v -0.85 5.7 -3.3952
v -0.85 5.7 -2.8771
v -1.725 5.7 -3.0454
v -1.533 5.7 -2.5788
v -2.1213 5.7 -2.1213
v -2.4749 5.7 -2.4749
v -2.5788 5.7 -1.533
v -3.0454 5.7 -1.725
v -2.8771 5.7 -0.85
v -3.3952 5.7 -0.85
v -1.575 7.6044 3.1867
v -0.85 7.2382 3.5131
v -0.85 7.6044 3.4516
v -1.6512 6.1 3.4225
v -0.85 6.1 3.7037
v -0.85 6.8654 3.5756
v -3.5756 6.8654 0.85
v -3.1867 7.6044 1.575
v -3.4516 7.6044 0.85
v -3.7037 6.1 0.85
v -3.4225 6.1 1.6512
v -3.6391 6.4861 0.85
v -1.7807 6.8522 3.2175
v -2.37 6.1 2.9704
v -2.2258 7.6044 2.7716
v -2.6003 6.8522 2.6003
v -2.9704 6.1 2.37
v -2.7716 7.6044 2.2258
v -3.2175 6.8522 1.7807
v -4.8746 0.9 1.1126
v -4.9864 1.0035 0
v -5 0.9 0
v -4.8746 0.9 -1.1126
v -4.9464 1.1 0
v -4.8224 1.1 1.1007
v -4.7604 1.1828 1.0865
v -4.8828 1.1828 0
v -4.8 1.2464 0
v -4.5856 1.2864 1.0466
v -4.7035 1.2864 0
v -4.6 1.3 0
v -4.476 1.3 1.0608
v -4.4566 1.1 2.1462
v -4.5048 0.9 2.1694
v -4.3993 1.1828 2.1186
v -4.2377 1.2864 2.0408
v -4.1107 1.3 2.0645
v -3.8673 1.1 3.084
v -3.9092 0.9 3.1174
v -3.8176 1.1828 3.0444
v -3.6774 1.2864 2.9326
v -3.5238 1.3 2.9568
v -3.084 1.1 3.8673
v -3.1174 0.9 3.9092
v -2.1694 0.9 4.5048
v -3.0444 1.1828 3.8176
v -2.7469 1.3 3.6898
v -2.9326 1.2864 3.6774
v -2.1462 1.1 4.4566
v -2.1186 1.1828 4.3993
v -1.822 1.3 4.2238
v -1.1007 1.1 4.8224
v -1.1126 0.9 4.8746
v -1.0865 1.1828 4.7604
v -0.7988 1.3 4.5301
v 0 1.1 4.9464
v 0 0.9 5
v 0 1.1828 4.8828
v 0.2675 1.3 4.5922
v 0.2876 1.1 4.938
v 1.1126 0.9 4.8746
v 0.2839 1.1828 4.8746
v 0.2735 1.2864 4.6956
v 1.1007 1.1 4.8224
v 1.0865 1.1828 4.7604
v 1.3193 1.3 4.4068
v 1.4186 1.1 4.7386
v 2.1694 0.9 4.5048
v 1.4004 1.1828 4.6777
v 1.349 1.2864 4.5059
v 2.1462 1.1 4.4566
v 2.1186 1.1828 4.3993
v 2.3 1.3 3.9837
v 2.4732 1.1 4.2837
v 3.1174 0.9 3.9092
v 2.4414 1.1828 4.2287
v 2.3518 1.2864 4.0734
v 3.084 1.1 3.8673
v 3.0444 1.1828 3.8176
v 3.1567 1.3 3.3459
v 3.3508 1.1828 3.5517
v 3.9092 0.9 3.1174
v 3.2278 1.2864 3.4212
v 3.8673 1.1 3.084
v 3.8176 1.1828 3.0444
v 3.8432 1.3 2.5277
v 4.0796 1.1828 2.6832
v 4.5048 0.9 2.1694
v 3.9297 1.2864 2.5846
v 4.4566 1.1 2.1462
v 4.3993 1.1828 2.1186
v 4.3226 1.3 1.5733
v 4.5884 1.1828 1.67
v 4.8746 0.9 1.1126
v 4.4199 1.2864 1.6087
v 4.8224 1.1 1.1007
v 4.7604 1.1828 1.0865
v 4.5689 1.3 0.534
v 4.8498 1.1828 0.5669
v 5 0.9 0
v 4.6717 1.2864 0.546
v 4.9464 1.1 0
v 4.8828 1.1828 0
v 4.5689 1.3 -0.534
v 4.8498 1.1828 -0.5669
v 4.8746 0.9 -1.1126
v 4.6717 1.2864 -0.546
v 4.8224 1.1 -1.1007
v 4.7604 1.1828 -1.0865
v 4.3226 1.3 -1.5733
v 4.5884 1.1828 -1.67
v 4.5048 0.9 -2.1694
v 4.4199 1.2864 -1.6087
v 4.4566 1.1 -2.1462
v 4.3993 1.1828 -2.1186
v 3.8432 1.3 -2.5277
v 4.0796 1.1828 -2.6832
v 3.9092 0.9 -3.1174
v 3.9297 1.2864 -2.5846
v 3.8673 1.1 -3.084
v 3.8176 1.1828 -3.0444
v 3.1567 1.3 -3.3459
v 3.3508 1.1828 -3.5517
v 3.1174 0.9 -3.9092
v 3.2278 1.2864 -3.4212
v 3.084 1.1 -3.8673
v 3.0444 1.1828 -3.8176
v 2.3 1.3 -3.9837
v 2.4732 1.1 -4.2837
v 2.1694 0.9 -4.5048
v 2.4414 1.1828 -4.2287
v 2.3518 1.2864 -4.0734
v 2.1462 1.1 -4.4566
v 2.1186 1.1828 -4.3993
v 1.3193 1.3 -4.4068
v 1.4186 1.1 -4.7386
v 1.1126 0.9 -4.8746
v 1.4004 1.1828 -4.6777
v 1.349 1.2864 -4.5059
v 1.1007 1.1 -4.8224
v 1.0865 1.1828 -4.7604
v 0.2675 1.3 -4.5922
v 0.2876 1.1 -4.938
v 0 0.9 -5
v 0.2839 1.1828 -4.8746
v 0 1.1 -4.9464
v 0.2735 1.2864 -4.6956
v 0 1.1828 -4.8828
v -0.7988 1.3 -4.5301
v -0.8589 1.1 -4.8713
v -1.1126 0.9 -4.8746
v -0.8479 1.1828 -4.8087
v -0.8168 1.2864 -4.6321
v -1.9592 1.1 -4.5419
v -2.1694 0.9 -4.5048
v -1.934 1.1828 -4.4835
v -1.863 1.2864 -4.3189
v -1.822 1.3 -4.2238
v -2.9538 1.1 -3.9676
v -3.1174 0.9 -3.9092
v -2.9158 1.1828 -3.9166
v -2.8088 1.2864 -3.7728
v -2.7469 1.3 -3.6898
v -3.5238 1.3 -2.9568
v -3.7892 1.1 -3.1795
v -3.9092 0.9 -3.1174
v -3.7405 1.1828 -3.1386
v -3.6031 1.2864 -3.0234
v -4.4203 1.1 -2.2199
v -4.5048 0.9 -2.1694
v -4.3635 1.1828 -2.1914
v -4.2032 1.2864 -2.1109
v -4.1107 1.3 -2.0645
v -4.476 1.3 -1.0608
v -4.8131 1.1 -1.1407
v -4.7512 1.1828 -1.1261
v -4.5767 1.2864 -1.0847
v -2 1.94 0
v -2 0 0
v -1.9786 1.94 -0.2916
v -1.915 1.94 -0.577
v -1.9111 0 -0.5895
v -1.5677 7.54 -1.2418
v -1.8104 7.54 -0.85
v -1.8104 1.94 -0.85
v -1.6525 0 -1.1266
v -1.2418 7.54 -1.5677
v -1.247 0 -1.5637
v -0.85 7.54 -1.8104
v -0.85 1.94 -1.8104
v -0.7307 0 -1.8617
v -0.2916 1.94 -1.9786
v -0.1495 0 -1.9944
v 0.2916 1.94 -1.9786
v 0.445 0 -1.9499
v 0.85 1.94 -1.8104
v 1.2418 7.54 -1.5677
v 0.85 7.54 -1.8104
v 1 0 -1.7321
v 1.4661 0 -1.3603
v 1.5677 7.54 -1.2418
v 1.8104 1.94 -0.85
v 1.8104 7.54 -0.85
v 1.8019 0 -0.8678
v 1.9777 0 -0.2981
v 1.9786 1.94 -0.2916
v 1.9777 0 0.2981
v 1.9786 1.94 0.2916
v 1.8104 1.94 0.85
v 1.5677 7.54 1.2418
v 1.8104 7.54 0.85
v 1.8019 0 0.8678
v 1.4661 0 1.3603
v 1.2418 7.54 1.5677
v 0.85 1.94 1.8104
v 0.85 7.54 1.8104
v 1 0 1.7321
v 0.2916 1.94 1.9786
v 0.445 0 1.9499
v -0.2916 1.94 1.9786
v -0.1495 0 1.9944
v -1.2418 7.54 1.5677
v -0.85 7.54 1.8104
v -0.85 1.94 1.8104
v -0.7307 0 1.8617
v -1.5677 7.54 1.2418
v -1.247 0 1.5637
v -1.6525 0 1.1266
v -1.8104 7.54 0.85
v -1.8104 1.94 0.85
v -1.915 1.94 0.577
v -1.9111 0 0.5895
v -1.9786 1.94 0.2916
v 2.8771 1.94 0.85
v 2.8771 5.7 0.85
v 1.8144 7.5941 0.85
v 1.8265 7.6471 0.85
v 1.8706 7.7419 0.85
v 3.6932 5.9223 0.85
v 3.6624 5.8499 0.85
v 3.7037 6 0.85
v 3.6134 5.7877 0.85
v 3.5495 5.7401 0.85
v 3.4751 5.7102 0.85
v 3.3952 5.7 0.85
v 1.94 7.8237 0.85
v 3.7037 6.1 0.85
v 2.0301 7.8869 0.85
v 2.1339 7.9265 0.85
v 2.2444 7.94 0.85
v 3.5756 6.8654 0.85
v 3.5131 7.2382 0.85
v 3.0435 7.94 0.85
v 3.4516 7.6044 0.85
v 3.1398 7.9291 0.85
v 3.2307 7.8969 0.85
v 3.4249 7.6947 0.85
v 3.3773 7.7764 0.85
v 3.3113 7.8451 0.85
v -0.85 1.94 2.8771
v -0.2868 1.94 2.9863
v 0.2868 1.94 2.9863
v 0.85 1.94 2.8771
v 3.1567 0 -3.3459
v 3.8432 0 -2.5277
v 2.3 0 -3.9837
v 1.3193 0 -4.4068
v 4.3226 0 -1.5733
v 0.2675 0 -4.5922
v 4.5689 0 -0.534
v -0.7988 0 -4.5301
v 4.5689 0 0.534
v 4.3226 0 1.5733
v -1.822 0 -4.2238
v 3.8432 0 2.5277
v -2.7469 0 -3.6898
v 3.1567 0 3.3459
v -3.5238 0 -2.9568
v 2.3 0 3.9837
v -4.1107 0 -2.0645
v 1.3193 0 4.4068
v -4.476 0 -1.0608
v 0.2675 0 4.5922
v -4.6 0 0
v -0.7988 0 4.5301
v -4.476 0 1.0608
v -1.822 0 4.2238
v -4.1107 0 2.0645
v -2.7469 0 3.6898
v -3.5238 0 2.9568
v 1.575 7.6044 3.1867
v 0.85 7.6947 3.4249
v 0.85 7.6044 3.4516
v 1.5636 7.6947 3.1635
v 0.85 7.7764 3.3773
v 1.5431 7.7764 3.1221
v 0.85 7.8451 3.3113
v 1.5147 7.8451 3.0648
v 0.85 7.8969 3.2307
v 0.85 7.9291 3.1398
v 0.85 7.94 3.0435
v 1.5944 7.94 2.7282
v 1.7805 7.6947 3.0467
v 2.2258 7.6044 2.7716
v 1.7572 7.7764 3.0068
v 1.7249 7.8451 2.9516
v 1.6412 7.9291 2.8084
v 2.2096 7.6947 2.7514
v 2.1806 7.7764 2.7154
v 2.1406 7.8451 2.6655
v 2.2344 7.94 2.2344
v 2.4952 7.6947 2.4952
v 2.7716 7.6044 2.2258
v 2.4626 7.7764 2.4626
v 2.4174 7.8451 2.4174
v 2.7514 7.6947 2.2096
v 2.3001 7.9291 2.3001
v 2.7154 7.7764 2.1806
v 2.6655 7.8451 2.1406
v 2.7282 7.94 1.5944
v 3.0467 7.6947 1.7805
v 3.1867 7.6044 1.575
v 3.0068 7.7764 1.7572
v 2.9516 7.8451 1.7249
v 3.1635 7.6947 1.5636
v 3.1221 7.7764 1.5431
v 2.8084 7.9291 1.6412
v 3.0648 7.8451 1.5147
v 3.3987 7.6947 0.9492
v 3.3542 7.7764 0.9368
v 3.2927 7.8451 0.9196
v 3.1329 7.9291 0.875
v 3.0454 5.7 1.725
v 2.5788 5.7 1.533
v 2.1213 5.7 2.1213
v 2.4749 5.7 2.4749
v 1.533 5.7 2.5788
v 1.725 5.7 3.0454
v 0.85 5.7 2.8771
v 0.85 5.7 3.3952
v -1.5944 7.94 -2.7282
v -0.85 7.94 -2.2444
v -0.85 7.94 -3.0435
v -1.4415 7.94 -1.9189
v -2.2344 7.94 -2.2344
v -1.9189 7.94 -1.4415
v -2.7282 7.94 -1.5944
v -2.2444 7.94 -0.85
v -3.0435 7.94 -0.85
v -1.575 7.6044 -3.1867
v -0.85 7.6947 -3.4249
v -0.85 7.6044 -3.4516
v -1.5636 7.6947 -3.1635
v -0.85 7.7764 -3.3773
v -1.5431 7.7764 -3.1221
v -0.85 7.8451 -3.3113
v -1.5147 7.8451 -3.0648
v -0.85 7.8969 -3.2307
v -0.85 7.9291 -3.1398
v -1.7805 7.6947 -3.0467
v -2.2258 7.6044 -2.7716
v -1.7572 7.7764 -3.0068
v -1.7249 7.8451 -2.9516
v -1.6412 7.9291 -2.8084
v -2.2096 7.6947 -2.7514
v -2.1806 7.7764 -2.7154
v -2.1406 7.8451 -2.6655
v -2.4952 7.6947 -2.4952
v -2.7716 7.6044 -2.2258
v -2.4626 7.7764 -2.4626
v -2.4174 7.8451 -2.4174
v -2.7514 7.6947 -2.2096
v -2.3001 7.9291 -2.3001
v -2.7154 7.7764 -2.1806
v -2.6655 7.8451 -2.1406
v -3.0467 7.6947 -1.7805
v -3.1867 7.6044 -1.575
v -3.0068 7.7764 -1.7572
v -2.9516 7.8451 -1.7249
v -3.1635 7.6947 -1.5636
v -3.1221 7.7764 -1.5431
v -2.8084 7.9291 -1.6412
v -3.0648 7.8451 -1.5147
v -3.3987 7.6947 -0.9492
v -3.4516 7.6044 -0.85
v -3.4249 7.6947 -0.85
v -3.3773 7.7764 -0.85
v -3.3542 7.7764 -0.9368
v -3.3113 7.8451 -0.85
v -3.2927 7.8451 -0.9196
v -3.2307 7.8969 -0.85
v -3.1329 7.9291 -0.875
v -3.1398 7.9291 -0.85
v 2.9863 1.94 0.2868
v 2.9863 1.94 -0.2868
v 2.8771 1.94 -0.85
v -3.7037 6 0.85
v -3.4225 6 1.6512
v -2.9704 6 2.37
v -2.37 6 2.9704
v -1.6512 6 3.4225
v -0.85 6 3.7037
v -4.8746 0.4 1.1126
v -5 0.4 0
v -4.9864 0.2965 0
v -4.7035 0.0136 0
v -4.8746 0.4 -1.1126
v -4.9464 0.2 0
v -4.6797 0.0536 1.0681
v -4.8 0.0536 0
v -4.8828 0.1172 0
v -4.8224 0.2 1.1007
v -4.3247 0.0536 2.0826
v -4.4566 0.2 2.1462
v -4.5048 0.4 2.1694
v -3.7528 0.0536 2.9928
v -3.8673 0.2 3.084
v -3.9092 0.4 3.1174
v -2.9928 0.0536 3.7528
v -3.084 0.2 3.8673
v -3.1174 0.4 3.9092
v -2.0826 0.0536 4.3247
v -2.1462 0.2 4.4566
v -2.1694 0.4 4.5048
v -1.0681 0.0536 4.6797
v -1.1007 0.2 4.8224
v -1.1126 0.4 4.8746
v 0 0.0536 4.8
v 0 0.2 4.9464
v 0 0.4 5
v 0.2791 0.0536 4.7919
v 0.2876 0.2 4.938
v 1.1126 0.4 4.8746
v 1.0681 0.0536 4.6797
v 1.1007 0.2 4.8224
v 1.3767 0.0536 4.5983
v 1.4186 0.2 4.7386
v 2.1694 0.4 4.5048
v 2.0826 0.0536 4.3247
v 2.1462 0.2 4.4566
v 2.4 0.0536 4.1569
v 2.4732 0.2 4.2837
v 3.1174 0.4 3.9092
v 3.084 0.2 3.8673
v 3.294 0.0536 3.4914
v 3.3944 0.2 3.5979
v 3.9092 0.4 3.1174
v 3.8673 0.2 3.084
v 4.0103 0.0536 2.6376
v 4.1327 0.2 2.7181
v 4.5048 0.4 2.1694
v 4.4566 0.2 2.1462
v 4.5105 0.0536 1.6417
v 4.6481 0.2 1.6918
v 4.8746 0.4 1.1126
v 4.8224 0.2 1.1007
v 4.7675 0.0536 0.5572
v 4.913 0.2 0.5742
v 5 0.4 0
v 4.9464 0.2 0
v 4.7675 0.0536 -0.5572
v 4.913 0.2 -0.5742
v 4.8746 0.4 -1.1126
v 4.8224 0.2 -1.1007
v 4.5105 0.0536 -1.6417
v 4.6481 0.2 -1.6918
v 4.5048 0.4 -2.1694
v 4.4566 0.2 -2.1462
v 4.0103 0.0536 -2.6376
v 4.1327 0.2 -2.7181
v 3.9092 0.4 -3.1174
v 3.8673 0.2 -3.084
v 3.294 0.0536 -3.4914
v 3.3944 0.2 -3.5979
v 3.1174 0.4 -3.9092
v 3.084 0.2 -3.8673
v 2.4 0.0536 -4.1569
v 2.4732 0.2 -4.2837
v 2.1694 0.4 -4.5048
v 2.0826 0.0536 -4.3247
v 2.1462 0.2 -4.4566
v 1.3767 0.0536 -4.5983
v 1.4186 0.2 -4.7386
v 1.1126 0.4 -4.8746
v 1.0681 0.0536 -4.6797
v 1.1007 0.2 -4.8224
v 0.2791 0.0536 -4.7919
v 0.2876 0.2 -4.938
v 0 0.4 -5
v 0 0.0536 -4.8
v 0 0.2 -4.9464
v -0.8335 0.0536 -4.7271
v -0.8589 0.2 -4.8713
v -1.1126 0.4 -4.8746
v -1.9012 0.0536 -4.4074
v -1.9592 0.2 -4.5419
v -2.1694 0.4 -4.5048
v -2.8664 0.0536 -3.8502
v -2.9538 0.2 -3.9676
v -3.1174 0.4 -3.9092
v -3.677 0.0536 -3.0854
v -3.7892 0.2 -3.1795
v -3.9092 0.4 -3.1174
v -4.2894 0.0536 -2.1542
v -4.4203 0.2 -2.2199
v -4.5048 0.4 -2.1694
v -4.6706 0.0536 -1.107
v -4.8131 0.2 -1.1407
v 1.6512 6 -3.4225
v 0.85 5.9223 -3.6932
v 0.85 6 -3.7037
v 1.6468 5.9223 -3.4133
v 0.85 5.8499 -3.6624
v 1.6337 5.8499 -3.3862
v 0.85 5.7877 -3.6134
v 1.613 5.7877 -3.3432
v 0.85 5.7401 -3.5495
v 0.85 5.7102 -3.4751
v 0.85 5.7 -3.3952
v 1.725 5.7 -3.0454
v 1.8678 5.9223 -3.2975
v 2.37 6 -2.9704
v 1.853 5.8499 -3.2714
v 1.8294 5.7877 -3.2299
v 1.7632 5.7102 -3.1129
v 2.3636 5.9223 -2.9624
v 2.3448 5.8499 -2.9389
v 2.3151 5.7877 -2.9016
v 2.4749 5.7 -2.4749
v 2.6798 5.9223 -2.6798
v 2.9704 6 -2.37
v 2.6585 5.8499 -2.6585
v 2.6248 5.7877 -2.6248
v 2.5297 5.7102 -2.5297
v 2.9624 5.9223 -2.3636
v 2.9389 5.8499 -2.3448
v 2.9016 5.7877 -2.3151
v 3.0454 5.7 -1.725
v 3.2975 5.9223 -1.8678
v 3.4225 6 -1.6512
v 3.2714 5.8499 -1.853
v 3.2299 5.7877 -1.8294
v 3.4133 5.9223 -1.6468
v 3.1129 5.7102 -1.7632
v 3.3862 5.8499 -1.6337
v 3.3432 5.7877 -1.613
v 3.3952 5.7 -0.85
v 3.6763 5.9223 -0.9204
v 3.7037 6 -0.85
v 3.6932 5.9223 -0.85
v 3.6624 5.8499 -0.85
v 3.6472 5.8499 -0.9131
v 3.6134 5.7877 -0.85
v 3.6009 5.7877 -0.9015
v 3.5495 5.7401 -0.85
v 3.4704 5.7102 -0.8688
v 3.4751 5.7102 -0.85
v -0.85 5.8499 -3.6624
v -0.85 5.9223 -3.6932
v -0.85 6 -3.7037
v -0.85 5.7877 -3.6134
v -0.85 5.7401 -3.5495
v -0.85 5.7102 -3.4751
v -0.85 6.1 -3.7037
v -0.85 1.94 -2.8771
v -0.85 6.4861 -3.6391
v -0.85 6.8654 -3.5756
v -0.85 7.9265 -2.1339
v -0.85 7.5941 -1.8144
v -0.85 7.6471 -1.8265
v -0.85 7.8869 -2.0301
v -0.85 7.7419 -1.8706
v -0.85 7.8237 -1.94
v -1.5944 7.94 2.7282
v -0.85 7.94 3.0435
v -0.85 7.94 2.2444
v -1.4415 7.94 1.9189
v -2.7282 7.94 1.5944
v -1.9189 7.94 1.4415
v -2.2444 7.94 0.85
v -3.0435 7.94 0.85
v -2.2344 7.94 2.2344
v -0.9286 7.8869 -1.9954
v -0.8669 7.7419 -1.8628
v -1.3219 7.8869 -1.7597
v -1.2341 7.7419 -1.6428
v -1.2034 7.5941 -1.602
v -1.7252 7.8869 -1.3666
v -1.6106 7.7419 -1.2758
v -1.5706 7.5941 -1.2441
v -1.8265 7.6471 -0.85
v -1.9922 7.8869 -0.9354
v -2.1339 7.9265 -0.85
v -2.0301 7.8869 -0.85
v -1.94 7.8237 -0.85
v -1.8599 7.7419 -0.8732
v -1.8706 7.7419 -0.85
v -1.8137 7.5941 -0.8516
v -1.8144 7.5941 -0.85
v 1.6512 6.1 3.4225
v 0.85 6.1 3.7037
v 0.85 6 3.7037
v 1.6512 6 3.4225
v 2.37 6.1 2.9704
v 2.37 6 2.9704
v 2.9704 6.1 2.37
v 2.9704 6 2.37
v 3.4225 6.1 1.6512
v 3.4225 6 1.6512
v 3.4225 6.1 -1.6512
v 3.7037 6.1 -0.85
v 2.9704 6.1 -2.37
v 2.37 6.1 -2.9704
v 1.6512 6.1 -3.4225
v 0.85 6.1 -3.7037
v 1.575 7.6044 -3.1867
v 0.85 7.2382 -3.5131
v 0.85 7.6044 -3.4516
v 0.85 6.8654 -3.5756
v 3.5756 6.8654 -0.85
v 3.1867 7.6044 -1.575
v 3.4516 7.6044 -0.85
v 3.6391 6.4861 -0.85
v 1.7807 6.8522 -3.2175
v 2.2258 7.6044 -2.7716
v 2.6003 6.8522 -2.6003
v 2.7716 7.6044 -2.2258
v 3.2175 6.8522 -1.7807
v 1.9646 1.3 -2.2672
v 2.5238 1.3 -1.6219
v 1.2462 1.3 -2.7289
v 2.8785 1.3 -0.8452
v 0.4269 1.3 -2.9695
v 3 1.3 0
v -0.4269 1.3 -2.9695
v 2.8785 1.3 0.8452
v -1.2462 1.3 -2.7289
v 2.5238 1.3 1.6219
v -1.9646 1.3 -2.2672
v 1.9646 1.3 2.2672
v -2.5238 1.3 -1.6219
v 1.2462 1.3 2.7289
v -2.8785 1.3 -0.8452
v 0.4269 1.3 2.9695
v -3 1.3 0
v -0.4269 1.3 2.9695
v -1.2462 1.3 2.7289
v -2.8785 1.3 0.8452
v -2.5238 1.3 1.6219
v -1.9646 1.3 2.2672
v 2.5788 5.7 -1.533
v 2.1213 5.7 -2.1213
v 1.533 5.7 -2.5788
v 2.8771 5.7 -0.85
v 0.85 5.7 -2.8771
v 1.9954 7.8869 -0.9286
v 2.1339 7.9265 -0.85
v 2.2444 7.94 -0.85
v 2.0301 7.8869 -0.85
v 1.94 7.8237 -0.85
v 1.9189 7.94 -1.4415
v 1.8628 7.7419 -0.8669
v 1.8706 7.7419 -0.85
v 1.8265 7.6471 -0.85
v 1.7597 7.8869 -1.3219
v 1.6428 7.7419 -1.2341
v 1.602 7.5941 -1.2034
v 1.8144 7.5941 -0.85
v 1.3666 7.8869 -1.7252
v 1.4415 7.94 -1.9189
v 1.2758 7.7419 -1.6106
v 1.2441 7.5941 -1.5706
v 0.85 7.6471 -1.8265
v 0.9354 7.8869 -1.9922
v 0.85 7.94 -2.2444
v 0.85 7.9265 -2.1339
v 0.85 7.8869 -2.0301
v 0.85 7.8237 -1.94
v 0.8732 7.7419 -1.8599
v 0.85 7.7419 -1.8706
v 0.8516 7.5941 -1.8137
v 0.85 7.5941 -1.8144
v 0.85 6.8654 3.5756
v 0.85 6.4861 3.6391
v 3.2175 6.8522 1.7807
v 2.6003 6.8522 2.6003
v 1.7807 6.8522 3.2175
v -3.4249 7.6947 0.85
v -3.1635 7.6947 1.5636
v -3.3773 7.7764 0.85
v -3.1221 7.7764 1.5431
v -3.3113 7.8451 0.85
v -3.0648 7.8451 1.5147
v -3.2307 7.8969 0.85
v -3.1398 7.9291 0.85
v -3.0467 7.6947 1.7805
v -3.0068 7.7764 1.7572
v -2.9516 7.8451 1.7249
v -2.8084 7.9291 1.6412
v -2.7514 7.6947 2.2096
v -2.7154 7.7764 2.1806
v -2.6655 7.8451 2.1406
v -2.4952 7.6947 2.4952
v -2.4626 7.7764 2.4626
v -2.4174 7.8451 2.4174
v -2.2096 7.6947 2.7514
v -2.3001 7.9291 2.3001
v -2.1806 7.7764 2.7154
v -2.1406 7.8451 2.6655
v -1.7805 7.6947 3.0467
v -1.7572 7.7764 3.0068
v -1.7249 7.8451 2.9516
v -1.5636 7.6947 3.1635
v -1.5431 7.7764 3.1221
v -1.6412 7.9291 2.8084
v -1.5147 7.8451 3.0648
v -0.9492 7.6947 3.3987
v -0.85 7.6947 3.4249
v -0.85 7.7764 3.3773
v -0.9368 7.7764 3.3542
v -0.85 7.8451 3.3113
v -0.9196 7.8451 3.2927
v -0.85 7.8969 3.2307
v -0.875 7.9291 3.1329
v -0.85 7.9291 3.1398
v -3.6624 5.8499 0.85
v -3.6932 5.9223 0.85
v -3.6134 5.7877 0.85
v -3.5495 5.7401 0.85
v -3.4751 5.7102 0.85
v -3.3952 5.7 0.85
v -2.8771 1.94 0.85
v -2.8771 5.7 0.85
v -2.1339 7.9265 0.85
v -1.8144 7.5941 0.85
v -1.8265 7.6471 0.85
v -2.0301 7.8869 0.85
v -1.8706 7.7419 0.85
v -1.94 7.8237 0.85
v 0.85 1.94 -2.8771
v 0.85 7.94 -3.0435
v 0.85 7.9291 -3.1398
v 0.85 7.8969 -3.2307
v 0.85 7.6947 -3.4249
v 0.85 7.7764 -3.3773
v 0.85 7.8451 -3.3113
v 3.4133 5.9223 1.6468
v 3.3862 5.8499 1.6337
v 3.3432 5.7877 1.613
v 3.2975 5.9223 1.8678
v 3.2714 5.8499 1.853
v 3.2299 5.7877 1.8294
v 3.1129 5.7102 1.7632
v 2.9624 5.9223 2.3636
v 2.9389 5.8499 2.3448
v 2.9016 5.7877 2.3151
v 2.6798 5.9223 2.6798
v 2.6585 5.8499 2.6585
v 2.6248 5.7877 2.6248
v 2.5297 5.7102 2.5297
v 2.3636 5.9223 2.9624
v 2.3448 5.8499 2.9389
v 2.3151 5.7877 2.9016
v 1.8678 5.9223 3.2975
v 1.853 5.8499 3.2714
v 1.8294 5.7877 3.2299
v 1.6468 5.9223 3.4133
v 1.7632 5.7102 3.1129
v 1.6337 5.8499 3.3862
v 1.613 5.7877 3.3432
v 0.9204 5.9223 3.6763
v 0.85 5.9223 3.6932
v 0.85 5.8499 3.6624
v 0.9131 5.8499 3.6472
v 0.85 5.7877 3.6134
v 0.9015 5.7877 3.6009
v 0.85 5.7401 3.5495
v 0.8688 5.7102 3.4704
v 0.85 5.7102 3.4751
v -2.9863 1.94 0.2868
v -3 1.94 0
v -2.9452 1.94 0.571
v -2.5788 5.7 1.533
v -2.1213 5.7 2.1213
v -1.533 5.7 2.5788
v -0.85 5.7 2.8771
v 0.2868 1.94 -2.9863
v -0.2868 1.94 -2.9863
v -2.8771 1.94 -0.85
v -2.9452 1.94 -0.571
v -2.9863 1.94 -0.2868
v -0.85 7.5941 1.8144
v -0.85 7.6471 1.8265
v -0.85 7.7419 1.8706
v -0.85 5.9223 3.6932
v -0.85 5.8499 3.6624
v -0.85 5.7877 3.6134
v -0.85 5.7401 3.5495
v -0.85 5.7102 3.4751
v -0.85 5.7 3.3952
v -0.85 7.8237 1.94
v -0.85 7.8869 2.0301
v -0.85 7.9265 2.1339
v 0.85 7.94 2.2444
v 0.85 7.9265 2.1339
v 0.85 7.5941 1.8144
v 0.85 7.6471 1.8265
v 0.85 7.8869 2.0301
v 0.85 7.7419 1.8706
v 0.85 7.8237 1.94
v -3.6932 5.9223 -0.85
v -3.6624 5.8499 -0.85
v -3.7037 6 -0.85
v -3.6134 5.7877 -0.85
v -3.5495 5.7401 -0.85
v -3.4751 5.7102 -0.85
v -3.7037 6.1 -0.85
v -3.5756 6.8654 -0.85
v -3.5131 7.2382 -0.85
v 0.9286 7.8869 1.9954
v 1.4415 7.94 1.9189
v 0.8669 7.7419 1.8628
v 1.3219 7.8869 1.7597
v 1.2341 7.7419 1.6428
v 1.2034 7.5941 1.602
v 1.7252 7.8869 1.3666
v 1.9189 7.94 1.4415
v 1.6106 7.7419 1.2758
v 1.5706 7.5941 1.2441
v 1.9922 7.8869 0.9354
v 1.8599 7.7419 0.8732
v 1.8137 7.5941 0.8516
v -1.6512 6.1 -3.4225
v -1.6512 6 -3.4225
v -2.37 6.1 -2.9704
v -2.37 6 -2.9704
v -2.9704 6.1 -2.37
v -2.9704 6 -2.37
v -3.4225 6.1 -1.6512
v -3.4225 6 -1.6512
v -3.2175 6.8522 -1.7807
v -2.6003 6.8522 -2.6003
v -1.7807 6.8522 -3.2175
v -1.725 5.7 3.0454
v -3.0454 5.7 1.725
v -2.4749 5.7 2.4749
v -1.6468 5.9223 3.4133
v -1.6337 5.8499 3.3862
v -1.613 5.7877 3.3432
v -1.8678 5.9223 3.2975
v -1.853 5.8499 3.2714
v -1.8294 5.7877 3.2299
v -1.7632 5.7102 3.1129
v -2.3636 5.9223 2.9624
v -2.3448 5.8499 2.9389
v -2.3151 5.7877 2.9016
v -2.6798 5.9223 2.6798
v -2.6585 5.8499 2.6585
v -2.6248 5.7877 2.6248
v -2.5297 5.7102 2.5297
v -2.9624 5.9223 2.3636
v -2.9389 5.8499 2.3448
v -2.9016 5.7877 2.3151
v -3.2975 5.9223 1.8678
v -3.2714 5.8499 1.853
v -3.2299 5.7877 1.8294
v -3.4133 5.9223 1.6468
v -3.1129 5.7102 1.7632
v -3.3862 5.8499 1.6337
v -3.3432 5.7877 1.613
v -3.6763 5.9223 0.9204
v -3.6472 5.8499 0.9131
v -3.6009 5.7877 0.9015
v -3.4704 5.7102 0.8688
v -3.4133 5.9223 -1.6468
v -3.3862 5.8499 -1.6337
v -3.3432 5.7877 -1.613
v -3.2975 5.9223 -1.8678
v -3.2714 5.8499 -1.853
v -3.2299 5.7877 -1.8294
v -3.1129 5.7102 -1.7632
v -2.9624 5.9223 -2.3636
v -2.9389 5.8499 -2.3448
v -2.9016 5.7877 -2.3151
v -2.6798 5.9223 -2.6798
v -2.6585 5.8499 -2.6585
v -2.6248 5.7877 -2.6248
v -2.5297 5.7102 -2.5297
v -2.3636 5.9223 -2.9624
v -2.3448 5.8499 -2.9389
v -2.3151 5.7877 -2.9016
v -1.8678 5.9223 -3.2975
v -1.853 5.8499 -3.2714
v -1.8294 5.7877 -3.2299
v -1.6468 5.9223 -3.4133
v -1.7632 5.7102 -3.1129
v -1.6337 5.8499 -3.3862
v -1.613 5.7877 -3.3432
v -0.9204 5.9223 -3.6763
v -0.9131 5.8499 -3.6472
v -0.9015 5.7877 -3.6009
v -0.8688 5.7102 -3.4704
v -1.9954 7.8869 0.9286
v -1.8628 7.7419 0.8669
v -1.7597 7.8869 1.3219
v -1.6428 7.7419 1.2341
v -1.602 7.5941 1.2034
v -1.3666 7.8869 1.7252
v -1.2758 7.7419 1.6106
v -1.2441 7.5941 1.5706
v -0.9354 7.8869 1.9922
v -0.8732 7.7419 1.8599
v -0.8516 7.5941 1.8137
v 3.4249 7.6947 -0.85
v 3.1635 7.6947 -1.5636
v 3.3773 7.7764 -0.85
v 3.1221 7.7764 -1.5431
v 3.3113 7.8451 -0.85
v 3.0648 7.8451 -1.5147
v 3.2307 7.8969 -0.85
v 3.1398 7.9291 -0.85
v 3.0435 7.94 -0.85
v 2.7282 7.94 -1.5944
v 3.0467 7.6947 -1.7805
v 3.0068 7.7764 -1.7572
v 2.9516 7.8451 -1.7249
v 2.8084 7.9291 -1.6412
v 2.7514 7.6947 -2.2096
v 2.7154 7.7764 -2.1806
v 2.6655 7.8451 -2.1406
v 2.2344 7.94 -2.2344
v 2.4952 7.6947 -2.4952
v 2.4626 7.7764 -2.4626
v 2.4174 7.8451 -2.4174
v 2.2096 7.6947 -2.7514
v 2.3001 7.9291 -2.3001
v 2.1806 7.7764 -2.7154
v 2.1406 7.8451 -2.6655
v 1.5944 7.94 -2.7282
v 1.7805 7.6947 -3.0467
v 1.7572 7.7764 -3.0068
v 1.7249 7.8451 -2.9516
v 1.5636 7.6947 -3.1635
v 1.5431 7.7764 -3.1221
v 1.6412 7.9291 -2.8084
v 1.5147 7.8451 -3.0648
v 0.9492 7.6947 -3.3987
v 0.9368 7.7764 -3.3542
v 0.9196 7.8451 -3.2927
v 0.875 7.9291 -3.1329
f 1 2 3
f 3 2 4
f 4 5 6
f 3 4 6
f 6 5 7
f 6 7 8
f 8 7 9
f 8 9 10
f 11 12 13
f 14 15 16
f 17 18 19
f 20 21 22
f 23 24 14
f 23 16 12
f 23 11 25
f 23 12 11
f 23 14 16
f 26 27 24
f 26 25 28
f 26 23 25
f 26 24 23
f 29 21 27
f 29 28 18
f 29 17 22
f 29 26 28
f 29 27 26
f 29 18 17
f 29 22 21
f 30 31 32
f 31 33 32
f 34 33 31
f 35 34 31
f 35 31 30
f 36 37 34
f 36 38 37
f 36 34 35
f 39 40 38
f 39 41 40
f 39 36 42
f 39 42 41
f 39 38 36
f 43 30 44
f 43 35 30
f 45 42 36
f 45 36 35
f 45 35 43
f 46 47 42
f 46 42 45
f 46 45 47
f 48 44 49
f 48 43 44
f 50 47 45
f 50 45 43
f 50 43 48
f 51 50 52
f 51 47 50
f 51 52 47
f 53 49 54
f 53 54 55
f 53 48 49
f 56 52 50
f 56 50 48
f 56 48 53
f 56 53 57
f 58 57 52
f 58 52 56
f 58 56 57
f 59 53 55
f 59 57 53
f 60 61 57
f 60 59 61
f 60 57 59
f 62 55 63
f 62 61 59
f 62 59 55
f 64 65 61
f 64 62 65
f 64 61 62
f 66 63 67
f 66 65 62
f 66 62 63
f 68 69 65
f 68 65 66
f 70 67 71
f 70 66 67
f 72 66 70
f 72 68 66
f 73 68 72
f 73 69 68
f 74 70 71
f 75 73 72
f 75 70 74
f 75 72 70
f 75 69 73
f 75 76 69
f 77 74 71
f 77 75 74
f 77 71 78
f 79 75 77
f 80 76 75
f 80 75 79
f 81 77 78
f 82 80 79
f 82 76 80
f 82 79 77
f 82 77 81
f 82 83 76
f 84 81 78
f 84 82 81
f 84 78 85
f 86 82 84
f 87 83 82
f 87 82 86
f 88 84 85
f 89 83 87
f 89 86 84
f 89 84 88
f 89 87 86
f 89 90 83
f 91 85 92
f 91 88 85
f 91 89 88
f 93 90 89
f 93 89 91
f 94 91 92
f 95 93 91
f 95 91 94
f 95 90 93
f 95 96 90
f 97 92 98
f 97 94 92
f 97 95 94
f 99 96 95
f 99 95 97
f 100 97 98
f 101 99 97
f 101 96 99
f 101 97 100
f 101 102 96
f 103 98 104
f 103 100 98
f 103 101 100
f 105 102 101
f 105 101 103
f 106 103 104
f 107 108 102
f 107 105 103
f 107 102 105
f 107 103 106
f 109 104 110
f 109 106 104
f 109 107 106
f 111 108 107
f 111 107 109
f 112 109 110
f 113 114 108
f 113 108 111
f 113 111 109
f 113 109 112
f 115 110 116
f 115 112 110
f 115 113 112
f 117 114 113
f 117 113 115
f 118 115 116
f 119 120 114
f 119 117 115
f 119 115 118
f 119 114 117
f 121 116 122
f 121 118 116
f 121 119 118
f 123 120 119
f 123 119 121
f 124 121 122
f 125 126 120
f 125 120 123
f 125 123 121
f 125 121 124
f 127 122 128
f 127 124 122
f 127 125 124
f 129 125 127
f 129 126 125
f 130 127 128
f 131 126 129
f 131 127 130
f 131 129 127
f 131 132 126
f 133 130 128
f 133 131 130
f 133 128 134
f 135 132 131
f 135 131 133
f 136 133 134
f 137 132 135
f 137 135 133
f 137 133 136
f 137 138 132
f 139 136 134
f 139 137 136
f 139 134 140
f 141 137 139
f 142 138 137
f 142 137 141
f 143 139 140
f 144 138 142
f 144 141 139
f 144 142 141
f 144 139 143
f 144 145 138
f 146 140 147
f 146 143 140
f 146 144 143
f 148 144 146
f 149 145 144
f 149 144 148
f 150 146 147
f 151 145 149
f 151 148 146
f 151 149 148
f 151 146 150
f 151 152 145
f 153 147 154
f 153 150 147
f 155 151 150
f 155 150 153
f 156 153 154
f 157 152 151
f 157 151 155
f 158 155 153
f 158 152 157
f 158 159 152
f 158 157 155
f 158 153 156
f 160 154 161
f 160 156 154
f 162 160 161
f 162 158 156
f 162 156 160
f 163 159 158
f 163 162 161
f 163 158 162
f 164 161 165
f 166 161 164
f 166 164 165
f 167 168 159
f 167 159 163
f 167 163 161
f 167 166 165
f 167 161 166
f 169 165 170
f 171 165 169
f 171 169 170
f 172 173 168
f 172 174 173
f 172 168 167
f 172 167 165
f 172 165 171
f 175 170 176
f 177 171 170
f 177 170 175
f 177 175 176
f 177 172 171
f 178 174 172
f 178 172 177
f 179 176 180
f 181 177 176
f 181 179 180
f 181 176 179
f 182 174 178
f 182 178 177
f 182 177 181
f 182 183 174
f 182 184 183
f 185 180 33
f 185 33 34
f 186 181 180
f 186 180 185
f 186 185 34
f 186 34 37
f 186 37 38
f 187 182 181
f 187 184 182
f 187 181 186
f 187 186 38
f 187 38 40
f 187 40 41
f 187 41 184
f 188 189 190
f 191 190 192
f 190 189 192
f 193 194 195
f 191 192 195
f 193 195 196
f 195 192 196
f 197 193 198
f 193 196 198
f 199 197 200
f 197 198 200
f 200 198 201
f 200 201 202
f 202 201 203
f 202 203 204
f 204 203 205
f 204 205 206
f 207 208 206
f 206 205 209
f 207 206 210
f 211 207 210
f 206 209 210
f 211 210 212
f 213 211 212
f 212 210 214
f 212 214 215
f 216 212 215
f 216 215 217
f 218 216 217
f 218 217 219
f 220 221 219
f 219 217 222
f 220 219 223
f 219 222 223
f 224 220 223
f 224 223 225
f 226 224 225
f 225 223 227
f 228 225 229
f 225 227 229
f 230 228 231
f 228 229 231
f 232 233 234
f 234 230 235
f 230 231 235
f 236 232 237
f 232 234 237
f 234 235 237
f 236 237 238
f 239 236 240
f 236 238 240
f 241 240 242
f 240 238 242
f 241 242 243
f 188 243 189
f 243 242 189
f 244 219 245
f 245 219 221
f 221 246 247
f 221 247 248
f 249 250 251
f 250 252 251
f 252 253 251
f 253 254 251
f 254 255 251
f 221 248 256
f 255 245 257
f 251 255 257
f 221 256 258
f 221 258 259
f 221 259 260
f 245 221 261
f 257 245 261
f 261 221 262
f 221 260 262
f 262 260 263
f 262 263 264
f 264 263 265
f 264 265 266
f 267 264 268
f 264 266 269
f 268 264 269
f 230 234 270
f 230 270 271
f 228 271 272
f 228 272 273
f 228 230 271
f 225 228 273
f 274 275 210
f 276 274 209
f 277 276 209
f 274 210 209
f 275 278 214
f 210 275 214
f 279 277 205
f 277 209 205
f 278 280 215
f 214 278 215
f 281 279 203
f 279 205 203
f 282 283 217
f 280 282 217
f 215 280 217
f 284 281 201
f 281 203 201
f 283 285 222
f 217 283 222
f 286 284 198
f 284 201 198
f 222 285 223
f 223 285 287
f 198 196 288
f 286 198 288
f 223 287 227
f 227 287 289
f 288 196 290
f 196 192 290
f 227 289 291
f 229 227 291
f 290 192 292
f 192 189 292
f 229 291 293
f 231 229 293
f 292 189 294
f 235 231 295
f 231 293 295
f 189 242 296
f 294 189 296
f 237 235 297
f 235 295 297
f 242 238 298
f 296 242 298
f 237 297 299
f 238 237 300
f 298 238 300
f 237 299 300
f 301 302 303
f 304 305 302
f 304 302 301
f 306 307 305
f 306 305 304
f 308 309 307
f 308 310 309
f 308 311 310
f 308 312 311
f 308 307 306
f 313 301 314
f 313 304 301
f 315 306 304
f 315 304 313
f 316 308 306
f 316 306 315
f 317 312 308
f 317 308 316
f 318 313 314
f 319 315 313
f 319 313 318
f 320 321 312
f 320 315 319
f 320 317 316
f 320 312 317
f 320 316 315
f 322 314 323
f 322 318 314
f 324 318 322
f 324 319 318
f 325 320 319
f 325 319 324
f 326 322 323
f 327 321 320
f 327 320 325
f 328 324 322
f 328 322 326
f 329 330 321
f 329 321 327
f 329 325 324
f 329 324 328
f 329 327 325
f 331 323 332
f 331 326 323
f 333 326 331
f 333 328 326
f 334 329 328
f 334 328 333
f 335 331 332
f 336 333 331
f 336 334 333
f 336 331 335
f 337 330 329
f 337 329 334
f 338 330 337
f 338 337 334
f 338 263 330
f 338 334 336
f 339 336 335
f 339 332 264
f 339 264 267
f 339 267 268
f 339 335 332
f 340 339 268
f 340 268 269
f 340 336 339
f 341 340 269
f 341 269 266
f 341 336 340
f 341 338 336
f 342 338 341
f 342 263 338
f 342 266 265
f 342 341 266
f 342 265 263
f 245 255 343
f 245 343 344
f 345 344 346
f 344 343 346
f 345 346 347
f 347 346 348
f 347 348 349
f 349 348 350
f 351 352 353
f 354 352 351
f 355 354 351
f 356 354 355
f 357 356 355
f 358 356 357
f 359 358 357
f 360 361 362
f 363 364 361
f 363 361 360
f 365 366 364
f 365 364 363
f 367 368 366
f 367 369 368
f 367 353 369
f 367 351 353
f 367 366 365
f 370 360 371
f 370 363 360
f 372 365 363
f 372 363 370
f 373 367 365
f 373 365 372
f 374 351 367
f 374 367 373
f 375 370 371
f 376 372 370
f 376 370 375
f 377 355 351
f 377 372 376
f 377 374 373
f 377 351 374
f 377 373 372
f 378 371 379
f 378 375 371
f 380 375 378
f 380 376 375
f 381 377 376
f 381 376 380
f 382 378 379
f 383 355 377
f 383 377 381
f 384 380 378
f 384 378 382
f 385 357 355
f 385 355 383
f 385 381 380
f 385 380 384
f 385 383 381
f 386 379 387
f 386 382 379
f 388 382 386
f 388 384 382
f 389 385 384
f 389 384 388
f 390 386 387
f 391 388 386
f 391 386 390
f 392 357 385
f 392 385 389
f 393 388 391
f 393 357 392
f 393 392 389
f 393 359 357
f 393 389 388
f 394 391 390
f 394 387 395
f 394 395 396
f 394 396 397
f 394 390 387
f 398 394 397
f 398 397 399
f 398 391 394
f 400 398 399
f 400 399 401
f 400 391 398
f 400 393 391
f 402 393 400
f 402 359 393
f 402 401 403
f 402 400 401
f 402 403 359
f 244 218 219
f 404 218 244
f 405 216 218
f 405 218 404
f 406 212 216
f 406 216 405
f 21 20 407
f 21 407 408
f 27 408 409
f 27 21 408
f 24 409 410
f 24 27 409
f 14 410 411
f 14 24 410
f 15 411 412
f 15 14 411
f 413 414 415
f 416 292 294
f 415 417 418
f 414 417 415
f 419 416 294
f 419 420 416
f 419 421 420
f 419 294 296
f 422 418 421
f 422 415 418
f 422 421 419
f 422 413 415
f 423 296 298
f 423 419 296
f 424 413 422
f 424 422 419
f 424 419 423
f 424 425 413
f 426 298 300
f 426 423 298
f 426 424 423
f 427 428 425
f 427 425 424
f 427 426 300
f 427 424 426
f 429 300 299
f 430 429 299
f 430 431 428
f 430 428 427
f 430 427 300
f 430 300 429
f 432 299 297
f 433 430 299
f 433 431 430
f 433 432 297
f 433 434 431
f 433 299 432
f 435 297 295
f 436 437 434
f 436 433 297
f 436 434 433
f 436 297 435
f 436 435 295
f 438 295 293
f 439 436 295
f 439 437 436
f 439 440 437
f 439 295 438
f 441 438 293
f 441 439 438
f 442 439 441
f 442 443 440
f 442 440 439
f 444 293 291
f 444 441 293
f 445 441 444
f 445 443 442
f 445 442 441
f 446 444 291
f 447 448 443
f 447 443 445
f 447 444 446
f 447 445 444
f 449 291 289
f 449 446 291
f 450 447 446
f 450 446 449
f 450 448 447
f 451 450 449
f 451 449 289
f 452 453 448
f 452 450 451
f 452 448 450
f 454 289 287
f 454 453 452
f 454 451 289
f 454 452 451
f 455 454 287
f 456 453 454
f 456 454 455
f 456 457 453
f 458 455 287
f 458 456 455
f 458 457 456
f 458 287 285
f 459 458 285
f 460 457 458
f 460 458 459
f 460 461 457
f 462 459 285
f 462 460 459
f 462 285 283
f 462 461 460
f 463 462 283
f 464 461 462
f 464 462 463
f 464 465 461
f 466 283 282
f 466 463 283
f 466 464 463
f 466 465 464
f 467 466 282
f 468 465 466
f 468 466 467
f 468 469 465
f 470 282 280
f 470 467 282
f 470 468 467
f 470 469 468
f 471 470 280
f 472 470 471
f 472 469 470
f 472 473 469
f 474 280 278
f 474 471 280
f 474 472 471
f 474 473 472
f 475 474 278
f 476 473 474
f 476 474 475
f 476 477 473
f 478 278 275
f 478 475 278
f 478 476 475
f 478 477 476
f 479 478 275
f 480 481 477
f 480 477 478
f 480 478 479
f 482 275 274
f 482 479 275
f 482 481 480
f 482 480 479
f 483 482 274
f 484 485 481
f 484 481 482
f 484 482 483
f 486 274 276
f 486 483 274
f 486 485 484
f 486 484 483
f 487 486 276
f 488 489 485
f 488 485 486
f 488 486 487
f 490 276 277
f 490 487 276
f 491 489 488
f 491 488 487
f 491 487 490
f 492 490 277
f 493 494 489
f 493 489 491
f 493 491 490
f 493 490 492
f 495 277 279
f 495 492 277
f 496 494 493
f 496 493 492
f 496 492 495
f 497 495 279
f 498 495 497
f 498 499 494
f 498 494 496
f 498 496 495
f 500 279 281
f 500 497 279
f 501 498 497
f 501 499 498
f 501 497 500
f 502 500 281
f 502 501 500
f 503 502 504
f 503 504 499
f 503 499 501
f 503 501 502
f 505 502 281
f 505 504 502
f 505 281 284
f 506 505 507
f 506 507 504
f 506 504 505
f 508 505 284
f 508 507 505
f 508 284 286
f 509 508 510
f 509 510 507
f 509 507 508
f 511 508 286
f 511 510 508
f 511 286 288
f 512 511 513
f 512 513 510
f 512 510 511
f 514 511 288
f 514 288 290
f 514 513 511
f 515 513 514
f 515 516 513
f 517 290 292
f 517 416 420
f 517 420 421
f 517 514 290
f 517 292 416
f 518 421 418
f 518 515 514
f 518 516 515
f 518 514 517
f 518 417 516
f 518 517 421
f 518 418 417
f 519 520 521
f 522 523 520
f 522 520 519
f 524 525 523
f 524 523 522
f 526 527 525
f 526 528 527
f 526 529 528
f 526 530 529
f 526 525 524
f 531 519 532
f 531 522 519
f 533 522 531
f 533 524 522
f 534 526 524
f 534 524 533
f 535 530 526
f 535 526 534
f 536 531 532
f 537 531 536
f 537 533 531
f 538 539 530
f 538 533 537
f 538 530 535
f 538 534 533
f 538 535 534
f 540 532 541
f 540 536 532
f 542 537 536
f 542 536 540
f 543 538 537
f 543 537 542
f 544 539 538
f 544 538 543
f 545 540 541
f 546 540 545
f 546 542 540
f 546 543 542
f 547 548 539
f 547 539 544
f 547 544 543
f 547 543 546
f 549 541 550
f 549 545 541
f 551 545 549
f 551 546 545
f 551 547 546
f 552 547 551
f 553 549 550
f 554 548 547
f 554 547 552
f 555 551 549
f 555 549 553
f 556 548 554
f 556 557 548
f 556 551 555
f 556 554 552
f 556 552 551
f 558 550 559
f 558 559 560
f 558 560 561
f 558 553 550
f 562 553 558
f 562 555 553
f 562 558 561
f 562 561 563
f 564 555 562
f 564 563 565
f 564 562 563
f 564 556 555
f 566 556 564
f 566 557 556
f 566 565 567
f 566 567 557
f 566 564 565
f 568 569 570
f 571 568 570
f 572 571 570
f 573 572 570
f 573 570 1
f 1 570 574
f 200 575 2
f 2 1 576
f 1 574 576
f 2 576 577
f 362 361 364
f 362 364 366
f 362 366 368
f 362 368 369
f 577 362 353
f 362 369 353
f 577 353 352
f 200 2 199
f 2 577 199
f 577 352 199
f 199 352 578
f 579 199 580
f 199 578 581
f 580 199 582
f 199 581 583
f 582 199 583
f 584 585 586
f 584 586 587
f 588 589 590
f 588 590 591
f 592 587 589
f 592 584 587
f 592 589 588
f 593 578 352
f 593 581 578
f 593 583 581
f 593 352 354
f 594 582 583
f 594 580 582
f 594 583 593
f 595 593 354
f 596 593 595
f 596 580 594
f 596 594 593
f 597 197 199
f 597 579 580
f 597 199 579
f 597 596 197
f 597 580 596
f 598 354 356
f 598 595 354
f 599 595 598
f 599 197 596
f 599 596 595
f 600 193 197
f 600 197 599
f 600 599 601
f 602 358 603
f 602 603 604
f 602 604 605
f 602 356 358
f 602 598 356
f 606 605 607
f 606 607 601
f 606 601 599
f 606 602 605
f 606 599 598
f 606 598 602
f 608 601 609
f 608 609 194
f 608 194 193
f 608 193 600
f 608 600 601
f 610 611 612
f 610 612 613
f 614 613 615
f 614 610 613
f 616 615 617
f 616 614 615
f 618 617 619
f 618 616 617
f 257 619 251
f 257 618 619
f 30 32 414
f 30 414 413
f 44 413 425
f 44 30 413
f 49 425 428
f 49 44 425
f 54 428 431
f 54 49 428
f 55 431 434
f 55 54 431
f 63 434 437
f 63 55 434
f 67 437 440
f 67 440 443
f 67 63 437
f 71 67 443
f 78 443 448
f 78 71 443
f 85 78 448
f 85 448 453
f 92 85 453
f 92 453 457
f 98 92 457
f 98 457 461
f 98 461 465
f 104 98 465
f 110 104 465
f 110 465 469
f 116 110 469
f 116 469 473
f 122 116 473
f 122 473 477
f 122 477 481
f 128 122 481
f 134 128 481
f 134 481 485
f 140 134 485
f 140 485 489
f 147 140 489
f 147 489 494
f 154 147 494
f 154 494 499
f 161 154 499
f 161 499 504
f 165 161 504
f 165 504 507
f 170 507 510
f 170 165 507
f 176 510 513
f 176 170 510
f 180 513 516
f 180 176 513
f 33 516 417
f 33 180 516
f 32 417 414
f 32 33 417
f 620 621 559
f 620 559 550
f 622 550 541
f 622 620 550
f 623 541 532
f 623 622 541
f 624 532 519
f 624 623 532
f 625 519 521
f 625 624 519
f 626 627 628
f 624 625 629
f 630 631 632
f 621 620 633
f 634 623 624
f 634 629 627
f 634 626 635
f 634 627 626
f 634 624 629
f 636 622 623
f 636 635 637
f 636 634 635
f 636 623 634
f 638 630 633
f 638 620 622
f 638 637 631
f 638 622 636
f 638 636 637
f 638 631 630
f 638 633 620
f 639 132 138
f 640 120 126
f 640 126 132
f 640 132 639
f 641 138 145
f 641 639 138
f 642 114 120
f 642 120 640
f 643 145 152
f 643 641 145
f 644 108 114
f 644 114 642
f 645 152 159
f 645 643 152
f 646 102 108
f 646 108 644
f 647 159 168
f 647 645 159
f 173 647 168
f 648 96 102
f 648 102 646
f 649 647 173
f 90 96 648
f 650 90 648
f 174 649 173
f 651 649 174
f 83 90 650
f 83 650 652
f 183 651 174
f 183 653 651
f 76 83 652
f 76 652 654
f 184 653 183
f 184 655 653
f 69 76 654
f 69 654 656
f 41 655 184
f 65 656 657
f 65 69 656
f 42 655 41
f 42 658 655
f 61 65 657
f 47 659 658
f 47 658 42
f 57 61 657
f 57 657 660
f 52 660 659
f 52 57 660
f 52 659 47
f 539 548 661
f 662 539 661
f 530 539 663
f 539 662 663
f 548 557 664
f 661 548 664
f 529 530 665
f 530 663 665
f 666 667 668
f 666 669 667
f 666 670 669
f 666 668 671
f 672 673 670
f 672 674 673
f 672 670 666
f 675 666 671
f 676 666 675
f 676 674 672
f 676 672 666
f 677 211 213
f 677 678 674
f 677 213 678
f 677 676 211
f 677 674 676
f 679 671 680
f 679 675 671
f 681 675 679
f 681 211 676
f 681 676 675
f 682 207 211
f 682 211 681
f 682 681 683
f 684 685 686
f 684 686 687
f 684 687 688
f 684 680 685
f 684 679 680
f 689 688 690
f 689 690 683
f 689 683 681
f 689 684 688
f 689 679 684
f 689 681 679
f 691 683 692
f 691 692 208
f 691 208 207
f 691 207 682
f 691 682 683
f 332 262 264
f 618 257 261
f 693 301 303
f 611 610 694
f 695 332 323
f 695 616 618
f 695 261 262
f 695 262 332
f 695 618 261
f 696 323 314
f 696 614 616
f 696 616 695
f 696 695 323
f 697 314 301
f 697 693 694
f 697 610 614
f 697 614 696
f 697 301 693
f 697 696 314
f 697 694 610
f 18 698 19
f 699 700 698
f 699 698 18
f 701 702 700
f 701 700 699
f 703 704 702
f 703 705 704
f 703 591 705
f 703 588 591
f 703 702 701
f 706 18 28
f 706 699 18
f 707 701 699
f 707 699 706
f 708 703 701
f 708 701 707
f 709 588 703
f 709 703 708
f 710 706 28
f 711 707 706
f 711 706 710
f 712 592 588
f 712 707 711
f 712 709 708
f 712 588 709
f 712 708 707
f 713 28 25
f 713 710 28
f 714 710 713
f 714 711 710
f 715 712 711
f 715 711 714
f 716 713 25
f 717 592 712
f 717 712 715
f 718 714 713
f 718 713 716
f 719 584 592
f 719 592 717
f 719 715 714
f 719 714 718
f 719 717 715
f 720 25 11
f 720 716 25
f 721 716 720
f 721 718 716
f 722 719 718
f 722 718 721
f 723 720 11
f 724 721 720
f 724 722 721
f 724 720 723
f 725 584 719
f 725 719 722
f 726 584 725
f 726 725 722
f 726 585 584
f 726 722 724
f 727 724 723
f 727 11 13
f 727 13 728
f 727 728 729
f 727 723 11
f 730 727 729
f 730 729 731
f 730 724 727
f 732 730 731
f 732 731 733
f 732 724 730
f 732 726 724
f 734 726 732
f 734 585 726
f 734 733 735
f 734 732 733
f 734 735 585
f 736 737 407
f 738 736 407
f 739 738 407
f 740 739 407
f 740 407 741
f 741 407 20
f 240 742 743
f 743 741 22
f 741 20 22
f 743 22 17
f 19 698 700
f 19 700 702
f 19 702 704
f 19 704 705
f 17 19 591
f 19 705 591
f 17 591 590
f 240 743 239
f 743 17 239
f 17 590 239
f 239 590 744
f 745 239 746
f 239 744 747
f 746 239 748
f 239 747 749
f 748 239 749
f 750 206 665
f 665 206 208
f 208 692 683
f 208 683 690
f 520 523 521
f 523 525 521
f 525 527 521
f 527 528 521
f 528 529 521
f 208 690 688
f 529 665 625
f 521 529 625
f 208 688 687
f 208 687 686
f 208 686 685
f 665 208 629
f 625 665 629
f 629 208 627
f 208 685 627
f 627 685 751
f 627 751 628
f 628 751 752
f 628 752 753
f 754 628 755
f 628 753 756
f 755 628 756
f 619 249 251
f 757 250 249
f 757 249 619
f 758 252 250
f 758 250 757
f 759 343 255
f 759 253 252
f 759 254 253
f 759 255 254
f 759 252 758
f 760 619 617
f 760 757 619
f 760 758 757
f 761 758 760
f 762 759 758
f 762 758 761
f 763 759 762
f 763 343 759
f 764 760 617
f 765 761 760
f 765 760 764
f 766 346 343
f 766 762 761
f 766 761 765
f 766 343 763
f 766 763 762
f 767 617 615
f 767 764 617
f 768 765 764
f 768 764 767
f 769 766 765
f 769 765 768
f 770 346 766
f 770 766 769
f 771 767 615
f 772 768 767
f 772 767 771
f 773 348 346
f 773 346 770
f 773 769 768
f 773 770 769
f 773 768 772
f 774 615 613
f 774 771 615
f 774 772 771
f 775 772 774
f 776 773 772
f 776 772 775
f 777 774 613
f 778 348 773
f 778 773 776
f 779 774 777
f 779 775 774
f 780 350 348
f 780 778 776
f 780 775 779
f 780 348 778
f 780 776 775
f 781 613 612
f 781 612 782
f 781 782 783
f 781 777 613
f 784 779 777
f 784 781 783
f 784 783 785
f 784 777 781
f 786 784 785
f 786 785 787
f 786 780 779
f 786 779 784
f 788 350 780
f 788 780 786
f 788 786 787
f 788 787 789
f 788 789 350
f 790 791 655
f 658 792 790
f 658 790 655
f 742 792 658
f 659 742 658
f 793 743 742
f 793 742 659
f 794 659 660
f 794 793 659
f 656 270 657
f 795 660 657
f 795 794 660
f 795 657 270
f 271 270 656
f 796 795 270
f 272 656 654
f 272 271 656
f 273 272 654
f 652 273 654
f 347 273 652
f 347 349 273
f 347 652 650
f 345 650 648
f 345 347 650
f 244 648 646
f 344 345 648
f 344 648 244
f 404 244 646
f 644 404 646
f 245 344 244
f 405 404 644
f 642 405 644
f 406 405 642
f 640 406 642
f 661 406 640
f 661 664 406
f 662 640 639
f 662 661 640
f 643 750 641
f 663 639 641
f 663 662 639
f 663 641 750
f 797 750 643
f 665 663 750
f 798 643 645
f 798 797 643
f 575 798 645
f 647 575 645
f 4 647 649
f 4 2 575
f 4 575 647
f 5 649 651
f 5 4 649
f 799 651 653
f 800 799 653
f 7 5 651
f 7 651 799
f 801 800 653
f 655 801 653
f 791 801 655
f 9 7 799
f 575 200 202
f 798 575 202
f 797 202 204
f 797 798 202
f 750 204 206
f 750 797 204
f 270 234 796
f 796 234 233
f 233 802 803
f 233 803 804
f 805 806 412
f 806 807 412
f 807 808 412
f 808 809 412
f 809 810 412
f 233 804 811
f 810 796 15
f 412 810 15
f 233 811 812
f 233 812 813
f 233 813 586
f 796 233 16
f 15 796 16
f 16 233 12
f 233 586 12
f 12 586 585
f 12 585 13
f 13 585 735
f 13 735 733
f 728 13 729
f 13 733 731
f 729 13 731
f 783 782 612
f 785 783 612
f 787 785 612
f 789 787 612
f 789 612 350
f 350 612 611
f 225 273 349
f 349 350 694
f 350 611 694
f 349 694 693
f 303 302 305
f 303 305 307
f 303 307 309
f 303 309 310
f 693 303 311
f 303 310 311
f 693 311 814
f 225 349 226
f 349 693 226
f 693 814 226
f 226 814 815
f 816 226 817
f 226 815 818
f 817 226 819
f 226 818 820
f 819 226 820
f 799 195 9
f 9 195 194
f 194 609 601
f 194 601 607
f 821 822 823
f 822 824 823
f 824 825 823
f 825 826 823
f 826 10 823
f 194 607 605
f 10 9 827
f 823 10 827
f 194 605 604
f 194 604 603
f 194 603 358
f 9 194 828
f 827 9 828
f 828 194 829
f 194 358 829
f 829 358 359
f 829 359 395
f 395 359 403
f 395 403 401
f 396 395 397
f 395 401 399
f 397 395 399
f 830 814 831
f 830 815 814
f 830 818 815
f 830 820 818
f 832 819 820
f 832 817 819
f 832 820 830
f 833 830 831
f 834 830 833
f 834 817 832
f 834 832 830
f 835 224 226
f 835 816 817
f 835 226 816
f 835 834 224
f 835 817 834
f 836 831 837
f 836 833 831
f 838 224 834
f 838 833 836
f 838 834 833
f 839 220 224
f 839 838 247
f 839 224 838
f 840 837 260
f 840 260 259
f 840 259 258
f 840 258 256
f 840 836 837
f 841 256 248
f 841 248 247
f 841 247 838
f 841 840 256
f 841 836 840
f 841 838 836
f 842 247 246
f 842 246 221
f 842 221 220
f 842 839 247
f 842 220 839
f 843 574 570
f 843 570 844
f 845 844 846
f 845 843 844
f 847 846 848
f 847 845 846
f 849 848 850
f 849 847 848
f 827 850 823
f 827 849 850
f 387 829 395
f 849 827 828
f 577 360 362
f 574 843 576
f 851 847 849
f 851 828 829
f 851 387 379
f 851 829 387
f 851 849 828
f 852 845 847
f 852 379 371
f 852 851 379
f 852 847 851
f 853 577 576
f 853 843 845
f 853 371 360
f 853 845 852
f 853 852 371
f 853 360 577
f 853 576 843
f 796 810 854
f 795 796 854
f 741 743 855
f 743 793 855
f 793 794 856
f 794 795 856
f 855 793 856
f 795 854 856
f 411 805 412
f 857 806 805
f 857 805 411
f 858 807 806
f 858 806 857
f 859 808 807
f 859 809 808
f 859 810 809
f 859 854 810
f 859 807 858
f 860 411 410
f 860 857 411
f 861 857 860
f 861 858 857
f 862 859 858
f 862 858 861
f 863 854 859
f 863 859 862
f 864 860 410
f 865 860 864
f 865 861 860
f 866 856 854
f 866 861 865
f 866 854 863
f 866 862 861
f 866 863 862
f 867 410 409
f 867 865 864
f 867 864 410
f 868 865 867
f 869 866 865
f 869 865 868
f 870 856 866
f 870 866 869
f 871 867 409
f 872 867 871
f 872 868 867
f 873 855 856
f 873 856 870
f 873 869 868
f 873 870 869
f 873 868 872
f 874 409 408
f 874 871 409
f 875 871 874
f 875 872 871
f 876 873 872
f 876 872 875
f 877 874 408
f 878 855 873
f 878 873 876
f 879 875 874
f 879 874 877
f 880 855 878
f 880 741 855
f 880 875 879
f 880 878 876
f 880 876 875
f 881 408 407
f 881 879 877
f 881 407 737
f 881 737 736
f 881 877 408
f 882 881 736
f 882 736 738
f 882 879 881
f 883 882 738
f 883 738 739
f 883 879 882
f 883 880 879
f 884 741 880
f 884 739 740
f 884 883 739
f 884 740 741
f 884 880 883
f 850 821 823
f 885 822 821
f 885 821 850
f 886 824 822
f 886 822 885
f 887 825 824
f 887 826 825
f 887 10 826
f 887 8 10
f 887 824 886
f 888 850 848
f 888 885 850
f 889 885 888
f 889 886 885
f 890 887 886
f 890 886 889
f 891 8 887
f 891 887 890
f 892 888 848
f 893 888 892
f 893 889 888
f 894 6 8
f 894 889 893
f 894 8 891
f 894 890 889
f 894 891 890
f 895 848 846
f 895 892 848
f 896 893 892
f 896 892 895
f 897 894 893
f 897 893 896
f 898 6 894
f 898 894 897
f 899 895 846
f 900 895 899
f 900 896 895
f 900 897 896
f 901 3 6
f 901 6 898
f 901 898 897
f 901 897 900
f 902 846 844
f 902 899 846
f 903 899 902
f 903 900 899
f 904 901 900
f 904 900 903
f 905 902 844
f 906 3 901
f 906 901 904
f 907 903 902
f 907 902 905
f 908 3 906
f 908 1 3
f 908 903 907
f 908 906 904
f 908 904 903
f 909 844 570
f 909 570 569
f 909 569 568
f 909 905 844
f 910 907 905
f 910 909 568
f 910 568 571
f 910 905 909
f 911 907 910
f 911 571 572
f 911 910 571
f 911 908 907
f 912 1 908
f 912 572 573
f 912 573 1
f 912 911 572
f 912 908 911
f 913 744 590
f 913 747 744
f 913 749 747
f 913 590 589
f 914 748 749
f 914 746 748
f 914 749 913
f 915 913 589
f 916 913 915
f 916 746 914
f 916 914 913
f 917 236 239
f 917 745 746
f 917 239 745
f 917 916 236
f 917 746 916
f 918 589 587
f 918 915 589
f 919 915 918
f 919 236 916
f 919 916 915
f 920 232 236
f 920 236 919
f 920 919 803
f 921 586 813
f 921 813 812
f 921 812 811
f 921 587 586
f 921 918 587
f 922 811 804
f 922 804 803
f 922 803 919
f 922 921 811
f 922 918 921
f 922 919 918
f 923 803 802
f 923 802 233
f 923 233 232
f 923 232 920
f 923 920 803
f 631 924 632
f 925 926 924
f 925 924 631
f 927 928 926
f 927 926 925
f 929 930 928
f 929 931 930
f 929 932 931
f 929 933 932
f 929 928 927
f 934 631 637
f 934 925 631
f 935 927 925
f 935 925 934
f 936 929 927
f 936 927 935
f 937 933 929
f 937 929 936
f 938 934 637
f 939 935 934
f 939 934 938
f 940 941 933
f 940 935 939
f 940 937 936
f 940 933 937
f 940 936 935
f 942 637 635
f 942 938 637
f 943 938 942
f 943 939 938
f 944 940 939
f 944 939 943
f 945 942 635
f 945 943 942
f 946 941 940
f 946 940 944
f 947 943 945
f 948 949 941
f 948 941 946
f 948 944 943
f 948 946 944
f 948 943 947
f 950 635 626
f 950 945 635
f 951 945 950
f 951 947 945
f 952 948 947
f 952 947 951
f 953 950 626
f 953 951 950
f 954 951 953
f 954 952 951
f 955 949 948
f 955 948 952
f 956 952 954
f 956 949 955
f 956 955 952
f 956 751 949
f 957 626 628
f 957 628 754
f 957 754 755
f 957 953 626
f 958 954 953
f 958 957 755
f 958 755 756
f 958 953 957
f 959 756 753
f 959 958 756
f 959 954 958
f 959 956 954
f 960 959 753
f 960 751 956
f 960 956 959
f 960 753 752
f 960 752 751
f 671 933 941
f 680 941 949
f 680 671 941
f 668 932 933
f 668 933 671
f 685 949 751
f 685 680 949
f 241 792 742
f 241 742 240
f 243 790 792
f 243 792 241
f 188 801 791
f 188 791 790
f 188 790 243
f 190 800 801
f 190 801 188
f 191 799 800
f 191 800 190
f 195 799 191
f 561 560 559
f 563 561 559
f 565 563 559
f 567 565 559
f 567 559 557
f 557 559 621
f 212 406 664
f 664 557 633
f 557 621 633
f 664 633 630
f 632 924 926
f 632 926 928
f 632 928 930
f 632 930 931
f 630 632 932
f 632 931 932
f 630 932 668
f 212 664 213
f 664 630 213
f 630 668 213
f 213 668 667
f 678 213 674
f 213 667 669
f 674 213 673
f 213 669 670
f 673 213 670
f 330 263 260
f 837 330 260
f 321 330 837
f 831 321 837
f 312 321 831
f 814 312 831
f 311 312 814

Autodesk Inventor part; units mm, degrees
ref_plane "YZ Plane" through (0, 0, 0) normal (1, 0, 0) x (0, 1, 0)
ref_plane "XZ Plane" through (0, 0, 0) normal (0, 1, 0) x (-1, 0, 0)
ref_plane "XY Plane" through (0, 0, 0) normal (0, 0, 1) x (1, 0, 0)
sketch "Эскиз1" plane through (0, 0, 0) normal (0, 0, 1) x (1, 0, 0)
  line L0 (0, 0) -> (0, 11.7004) construction
  line L1 (0, 0) -> (-23.4572, 0) construction
  line L2 (0, 0) -> (-5, 0)
  line L3 (-5, 0) -> (-5, 1.3)
  line L4 (-5, 1.3) -> (-3, 1.3)
  line L5 (-3, 1.3) -> (-3, 5.7)
  line L6 (-3, 5.7) -> (-3.8, 5.7)
  line L7 (-3.8, 5.7) -> (-3.8, 6.1)
  line L8 (-3.8, 6.1) -> (-3.5, 7.94)
  line L9 (-3.5, 7.94) -> (-2, 7.94)
  line L10 (-2, 7.94) -> (-2, 0)
  dimension "d0" = 5
  dimension "d1" = 1.3
  dimension "d2" = 3
  dimension "d3" = 4.4
  dimension "d4" = 2
  dimension "d5" = 7.94
  dimension "d6" = 3.5
  dimension "d8" = 3.8
  dimension "d9" = 0.4
revolve "Вращение1" add sketch "Эскиз1" angle 360 about axis through (0, 0, 0) along (0, 1, 0)
fillet "Сопряжение1" radius 0.4 2 edges at (5, 1.3, 0) (5, 0, 0)
fillet "Сопряжение2" radius 0.3 1 edges at (3.8, 5.7, 0)
fillet "Сопряжение3" radius 0.4 2 edges at (3.5, 7.94, 0) (2, 7.94, 0)
sketch "Эскиз2" plane through (0, 7.94, 0) normal (0, 1, 0) x (1, 0, 0)
  line L0 (-10.37, -0.85) -> (10.2464, -0.85)
  line L1 (10.2464, -0.85) -> (10.2464, 0.85)
  line L2 (10.2464, 0.85) -> (-10.37, 0.85)
  line L3 (-10.37, 0.85) -> (-10.37, -0.85)
  line L4 (-0.85, -12.4719) -> (0.85, -12.4719)
  line L5 (0.85, -12.4719) -> (0.85, 12.1626)
  line L6 (0.85, 12.1626) -> (-0.85, 12.1626)
  line L7 (-0.85, 12.1626) -> (-0.85, -12.4719)
  line L8 (0, 0) -> (-10.37, 0) construction
  line L9 (0, 0) -> (0, -12.4719) construction
  dimension "d14" = 1.7
  dimension "d15" = 1.7
extrude "Выдавливание1" cut sketch "Эскиз2" against normal blind 6
properties part number "NF-Crazy   фитинг"
